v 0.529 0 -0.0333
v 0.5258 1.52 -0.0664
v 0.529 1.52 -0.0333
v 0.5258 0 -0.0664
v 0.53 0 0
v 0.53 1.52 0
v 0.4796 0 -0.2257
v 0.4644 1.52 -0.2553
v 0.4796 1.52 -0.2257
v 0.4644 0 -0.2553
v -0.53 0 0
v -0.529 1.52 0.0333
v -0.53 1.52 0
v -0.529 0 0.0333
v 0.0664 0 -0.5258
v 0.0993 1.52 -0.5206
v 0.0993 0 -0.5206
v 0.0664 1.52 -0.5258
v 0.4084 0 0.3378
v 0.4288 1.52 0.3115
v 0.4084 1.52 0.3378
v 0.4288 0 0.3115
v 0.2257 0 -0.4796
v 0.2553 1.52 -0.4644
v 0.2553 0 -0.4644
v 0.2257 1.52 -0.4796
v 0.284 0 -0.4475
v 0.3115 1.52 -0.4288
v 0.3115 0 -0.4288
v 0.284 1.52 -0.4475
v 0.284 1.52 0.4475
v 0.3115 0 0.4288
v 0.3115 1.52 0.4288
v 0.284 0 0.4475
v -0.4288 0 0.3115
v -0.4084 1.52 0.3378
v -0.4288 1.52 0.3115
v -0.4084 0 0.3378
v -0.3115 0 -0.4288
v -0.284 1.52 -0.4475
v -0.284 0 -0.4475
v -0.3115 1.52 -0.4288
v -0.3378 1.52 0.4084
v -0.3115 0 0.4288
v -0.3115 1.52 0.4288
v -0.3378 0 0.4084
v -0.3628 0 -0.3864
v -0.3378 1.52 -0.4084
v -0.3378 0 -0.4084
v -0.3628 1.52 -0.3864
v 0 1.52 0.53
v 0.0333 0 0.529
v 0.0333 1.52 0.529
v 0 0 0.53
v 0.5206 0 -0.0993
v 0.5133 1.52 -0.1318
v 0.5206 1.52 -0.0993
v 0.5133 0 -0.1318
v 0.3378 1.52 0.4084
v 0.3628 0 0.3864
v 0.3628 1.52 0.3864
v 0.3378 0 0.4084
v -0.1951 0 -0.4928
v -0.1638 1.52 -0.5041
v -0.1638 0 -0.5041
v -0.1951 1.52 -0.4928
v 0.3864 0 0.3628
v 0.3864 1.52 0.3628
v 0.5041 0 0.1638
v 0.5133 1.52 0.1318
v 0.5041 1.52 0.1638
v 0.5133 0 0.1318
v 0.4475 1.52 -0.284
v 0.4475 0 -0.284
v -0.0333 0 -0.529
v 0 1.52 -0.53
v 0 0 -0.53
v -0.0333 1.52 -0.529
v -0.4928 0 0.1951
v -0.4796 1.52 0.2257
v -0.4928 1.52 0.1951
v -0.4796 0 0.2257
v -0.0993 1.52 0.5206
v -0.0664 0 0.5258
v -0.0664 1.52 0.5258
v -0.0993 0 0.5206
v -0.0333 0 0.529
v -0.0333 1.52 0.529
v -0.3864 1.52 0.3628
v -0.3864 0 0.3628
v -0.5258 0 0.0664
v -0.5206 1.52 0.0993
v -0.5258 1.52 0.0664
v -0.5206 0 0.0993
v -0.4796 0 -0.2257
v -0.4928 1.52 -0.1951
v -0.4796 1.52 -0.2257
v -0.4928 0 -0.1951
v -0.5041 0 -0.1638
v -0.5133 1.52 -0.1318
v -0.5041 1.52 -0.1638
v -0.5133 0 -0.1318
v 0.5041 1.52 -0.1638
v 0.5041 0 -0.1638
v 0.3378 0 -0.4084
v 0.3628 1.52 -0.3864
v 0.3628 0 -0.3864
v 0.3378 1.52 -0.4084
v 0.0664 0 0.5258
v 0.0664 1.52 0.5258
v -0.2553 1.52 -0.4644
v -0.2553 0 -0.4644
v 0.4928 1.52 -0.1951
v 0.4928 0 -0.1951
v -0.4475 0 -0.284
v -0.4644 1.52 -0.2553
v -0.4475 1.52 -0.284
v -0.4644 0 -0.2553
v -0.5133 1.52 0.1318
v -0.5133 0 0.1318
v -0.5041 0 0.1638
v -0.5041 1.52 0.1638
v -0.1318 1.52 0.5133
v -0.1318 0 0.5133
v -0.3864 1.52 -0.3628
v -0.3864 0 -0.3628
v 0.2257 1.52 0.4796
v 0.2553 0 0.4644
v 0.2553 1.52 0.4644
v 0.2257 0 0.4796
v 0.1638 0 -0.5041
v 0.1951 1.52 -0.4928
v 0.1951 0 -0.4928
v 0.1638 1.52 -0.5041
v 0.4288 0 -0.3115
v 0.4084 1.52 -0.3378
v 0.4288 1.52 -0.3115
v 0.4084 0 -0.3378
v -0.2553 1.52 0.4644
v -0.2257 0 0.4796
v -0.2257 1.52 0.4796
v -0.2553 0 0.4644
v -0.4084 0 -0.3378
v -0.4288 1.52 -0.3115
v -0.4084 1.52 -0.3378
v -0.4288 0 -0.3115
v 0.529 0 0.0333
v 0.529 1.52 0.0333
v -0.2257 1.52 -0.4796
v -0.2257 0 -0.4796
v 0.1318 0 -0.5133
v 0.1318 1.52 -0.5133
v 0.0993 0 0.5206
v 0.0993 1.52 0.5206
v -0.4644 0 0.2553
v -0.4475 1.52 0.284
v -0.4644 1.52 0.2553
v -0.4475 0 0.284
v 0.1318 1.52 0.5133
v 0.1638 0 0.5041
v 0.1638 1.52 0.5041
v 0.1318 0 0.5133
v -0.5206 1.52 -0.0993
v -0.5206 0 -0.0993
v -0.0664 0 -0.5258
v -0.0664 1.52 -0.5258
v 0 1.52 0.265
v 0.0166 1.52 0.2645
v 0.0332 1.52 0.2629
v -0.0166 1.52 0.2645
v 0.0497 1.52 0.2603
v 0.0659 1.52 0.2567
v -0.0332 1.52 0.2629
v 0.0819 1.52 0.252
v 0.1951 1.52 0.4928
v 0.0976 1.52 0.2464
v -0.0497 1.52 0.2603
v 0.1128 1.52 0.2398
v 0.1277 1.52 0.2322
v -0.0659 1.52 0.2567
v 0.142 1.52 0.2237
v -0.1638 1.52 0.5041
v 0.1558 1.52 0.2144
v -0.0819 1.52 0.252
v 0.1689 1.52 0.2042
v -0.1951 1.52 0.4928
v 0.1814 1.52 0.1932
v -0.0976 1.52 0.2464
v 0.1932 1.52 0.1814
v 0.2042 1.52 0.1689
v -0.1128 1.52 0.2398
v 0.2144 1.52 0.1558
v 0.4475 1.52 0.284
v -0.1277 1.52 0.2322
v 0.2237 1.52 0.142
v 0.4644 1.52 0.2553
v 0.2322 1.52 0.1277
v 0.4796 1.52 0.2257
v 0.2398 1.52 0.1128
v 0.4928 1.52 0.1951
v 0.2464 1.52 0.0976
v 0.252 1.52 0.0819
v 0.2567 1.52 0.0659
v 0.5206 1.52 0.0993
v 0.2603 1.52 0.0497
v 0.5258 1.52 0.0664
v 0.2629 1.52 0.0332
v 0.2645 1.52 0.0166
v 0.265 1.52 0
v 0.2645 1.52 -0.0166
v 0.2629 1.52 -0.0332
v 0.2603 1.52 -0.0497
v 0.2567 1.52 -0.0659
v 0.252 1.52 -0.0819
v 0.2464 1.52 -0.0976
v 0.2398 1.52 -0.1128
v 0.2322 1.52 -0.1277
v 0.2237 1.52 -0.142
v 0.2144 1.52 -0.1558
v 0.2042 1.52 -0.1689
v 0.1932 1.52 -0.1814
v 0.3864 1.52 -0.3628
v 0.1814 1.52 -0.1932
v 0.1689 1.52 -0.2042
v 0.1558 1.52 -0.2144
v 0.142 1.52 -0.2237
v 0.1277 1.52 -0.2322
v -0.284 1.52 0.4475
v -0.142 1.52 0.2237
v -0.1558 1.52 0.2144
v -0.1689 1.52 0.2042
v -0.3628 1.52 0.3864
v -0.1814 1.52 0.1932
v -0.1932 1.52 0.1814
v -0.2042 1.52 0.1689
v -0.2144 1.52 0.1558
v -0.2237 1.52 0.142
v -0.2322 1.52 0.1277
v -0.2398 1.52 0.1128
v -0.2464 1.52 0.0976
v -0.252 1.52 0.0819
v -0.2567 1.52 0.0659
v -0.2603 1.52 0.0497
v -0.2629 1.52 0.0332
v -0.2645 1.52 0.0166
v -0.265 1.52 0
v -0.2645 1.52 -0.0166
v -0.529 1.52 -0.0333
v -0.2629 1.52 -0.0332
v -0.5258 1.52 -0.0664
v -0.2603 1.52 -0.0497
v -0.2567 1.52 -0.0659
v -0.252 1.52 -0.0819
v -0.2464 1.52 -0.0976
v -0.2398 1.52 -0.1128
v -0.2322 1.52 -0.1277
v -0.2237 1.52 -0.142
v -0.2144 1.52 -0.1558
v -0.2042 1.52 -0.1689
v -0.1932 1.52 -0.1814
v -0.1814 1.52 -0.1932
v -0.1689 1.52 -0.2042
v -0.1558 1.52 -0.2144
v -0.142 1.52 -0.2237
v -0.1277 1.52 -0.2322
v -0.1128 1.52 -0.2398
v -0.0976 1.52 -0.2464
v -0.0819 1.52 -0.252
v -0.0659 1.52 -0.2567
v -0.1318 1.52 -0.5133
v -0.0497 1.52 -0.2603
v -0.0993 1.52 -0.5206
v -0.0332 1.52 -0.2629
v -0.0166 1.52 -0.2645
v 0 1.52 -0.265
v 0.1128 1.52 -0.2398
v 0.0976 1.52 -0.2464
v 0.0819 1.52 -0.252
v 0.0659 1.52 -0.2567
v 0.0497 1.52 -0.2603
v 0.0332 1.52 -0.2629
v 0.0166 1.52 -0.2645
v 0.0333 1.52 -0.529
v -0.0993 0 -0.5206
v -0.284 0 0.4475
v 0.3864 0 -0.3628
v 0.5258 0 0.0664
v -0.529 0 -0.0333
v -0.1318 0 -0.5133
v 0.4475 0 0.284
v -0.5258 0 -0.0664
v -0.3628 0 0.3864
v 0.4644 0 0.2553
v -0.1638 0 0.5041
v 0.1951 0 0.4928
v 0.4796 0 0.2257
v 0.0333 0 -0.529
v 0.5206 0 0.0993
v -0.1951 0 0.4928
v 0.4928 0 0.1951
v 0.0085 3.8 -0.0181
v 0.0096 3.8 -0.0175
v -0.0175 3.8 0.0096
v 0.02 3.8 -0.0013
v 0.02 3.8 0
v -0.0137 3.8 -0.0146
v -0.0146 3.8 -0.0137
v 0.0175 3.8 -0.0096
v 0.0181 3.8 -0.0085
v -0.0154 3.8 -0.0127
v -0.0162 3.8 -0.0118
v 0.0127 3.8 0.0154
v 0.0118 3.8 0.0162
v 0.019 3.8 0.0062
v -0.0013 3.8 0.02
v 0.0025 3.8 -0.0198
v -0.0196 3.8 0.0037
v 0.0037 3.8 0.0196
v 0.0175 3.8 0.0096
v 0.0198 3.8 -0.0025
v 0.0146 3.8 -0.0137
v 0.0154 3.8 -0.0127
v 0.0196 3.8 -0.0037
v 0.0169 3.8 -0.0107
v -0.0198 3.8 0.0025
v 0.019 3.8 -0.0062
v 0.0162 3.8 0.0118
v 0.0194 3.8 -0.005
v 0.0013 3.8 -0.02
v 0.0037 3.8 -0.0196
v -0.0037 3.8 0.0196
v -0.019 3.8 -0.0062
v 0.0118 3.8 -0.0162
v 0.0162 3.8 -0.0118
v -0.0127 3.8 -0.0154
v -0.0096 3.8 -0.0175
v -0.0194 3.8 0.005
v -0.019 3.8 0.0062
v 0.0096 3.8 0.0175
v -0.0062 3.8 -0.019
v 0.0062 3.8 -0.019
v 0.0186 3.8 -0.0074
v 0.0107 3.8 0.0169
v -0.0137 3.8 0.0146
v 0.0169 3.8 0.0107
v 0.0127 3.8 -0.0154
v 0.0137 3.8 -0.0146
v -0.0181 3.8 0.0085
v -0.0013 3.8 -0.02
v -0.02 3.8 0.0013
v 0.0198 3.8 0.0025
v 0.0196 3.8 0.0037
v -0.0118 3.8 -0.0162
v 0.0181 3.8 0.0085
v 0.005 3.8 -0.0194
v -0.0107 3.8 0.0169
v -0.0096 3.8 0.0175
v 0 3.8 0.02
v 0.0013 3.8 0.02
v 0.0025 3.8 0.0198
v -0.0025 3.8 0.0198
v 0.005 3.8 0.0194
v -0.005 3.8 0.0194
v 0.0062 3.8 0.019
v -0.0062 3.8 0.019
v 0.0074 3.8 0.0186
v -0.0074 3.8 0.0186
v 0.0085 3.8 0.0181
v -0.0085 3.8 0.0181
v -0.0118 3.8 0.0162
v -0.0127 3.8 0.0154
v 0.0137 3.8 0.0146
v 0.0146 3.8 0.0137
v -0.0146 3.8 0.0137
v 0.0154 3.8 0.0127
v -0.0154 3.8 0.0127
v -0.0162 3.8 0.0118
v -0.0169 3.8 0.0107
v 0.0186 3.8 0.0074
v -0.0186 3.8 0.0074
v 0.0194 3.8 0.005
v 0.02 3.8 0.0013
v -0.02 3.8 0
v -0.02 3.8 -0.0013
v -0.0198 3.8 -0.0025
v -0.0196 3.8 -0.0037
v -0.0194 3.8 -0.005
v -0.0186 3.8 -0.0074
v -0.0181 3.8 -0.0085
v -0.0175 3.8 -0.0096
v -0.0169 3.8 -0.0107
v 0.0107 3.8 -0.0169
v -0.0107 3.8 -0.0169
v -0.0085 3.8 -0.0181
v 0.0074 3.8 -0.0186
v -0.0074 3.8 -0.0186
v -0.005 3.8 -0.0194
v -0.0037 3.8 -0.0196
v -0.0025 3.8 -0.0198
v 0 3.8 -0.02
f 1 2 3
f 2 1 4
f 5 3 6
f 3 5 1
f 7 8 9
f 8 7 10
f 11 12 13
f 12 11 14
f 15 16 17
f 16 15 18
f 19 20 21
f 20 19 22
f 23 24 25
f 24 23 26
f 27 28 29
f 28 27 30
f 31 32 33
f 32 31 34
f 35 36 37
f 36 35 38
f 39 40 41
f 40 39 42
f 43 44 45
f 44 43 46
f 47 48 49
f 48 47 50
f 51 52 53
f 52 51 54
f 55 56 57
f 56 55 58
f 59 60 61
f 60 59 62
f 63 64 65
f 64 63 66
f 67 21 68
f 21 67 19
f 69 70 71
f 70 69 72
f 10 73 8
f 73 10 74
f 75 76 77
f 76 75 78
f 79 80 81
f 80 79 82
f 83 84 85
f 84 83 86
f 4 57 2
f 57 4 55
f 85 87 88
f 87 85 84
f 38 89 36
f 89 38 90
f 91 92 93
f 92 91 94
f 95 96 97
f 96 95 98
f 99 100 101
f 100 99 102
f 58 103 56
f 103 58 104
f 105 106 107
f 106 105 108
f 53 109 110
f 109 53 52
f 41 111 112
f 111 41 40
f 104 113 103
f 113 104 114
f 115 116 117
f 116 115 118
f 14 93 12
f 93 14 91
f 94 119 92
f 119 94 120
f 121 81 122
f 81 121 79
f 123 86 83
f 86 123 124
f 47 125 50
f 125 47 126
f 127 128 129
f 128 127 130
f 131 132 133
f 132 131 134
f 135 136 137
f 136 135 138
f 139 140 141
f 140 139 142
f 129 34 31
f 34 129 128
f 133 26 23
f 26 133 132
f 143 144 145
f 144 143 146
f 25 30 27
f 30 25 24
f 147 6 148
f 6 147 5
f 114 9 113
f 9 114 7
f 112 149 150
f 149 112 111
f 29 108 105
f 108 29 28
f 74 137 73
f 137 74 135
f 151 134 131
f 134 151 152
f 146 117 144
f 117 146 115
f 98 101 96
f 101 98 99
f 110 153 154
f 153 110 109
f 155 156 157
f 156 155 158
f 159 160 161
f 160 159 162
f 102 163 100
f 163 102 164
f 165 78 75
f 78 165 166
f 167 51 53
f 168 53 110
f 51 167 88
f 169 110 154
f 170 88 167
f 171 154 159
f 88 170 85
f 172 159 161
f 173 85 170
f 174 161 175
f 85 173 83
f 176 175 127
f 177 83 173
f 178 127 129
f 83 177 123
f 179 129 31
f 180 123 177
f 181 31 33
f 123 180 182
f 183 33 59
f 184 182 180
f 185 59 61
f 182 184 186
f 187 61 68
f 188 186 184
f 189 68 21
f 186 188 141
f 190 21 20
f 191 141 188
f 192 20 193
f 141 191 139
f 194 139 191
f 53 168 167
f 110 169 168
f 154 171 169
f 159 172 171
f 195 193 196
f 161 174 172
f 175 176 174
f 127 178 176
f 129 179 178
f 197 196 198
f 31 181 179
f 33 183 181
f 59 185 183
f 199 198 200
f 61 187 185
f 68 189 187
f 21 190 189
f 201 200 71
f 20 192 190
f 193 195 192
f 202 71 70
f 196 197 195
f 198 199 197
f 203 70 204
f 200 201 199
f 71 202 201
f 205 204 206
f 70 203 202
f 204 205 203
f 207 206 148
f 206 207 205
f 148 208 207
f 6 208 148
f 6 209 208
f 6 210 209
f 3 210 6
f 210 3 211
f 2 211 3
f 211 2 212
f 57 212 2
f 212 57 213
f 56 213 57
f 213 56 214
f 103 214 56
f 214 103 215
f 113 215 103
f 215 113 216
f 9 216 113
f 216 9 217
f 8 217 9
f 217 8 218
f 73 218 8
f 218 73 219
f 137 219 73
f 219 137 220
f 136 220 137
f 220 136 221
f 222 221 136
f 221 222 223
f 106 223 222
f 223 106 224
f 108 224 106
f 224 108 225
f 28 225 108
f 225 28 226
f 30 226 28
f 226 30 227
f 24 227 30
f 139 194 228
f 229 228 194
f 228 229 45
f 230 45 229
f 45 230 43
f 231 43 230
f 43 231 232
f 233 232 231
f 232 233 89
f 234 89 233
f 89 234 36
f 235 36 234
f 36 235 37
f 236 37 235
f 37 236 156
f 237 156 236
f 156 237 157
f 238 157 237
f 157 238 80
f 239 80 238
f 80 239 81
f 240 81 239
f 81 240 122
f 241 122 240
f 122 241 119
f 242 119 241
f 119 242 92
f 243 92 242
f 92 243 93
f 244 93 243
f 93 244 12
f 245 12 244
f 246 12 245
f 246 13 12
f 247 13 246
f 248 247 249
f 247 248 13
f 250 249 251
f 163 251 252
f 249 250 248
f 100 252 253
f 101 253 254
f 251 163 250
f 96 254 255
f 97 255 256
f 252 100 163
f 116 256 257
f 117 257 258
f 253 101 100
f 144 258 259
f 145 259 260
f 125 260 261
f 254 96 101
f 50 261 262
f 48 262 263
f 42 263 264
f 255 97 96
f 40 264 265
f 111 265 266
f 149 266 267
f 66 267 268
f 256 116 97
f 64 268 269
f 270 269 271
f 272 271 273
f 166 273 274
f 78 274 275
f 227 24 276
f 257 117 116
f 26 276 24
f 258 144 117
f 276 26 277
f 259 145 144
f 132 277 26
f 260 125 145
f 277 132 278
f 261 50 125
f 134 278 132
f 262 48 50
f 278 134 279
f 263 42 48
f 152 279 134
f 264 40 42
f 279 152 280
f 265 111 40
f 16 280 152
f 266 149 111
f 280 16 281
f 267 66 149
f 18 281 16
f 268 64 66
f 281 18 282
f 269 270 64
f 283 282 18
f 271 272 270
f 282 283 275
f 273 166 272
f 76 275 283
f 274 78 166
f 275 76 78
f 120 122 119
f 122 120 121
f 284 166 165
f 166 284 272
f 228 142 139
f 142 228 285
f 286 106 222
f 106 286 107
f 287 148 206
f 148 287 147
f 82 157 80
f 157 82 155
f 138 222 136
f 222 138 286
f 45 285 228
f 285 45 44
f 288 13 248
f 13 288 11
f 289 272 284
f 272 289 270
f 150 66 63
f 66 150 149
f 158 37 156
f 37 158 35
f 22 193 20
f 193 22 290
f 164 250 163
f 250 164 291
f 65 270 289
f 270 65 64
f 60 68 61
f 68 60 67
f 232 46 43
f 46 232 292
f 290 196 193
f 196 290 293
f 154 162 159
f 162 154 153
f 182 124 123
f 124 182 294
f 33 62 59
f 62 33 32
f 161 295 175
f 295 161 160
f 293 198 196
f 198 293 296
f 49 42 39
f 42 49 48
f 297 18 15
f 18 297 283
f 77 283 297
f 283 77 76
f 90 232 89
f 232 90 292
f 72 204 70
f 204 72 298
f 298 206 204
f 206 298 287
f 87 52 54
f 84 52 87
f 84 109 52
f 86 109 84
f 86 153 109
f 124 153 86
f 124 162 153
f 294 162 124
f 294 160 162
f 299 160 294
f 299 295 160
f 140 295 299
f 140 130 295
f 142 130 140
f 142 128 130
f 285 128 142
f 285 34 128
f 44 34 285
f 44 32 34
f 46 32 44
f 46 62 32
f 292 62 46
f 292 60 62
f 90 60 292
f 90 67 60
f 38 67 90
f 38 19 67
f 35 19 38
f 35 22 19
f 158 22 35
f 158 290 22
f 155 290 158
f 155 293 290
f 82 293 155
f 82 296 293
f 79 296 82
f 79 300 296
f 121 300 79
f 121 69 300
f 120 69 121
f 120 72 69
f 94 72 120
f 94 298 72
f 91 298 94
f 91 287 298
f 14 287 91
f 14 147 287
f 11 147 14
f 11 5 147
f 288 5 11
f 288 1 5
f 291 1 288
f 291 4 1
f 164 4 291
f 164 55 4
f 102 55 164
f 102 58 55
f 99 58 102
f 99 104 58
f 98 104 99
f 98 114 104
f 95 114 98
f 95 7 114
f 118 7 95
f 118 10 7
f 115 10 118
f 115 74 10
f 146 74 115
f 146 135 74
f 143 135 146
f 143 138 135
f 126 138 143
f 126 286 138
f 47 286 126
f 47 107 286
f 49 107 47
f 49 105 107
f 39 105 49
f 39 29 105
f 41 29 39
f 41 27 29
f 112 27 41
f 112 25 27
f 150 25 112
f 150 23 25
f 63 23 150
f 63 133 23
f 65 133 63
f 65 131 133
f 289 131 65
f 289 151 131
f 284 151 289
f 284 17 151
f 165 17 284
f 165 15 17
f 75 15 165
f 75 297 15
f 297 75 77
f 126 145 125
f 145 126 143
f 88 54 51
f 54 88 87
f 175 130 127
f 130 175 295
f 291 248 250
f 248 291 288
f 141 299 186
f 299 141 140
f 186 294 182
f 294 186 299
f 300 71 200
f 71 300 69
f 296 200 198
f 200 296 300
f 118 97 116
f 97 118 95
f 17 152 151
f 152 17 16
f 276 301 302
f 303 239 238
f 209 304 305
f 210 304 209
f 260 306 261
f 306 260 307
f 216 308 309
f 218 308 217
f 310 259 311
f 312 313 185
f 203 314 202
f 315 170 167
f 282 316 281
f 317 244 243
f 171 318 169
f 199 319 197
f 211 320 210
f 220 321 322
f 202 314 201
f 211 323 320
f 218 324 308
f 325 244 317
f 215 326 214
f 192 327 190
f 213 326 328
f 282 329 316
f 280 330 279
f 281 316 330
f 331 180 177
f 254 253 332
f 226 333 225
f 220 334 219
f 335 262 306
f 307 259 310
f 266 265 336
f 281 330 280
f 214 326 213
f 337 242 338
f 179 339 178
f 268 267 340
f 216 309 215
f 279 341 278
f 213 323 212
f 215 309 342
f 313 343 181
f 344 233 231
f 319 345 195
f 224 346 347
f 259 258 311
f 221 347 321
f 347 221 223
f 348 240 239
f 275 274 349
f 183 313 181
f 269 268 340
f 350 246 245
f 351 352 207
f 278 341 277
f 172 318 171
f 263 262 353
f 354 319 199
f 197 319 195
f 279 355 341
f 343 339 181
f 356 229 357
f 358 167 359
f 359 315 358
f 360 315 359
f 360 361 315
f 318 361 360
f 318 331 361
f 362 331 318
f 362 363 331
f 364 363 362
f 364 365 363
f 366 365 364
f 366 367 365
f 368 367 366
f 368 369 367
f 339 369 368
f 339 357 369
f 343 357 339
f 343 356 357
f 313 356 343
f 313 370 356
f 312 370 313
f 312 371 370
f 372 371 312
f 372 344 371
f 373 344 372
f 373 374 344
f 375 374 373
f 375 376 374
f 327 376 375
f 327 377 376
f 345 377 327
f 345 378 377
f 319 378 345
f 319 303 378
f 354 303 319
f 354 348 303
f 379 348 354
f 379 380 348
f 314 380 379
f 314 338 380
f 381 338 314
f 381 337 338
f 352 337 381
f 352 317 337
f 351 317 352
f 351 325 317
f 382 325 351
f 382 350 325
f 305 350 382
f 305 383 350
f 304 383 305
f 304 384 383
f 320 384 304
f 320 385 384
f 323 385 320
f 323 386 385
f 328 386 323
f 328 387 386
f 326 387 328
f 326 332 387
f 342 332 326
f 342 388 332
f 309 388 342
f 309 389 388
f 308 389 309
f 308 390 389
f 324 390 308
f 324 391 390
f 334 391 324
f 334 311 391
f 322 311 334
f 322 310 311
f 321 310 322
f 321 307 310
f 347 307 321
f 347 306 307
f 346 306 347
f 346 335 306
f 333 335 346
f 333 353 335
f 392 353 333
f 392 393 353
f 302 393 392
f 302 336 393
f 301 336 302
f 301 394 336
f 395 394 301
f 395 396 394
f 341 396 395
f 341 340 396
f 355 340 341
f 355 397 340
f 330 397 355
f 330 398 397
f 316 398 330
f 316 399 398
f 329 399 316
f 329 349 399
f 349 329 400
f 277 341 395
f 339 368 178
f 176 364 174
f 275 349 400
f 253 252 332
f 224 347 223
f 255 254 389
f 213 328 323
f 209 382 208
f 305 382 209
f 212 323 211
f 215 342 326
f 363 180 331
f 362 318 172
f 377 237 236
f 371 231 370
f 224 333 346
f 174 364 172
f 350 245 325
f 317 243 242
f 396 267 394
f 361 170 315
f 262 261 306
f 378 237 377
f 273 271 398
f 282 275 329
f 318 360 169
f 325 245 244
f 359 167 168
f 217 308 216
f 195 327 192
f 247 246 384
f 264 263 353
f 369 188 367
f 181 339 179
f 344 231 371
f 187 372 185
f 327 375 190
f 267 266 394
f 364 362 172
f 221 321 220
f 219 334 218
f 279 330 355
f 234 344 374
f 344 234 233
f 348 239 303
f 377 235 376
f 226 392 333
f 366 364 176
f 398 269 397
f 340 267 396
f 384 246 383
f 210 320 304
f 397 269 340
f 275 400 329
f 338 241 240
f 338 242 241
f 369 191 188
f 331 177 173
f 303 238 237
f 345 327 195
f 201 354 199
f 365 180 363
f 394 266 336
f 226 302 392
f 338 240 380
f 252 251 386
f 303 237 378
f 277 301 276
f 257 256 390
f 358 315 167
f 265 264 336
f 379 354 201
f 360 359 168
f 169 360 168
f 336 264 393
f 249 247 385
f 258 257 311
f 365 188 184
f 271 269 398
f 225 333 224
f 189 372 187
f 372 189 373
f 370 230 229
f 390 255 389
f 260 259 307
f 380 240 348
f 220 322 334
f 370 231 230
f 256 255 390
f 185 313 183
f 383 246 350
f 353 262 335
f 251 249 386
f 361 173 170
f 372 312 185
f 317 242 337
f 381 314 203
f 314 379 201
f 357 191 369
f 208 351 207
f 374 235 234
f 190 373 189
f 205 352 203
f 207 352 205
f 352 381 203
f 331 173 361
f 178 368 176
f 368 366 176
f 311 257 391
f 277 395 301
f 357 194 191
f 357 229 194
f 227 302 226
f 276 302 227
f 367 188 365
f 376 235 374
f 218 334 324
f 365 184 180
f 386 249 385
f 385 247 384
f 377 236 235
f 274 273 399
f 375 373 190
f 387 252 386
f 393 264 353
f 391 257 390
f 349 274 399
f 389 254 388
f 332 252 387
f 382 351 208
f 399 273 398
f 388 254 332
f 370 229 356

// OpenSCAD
layer = 0.010;
px = 0.0076;

module pinhole(d=106*layer, l=200*px, orth=0, ychan_z_angle=0) {
    // This module operates on a standard of 10um layers and 7.6 um pixels
    rotate([-90, 0, orth]){
        union(){
            cylinder(d = d, h = l, $fn = 100);
            translate([0, 0, l])
                cylinder(h=300*px, r1=d/4, r2=2*layer, $fn = 100);
        }
    }
}

pinhole();
